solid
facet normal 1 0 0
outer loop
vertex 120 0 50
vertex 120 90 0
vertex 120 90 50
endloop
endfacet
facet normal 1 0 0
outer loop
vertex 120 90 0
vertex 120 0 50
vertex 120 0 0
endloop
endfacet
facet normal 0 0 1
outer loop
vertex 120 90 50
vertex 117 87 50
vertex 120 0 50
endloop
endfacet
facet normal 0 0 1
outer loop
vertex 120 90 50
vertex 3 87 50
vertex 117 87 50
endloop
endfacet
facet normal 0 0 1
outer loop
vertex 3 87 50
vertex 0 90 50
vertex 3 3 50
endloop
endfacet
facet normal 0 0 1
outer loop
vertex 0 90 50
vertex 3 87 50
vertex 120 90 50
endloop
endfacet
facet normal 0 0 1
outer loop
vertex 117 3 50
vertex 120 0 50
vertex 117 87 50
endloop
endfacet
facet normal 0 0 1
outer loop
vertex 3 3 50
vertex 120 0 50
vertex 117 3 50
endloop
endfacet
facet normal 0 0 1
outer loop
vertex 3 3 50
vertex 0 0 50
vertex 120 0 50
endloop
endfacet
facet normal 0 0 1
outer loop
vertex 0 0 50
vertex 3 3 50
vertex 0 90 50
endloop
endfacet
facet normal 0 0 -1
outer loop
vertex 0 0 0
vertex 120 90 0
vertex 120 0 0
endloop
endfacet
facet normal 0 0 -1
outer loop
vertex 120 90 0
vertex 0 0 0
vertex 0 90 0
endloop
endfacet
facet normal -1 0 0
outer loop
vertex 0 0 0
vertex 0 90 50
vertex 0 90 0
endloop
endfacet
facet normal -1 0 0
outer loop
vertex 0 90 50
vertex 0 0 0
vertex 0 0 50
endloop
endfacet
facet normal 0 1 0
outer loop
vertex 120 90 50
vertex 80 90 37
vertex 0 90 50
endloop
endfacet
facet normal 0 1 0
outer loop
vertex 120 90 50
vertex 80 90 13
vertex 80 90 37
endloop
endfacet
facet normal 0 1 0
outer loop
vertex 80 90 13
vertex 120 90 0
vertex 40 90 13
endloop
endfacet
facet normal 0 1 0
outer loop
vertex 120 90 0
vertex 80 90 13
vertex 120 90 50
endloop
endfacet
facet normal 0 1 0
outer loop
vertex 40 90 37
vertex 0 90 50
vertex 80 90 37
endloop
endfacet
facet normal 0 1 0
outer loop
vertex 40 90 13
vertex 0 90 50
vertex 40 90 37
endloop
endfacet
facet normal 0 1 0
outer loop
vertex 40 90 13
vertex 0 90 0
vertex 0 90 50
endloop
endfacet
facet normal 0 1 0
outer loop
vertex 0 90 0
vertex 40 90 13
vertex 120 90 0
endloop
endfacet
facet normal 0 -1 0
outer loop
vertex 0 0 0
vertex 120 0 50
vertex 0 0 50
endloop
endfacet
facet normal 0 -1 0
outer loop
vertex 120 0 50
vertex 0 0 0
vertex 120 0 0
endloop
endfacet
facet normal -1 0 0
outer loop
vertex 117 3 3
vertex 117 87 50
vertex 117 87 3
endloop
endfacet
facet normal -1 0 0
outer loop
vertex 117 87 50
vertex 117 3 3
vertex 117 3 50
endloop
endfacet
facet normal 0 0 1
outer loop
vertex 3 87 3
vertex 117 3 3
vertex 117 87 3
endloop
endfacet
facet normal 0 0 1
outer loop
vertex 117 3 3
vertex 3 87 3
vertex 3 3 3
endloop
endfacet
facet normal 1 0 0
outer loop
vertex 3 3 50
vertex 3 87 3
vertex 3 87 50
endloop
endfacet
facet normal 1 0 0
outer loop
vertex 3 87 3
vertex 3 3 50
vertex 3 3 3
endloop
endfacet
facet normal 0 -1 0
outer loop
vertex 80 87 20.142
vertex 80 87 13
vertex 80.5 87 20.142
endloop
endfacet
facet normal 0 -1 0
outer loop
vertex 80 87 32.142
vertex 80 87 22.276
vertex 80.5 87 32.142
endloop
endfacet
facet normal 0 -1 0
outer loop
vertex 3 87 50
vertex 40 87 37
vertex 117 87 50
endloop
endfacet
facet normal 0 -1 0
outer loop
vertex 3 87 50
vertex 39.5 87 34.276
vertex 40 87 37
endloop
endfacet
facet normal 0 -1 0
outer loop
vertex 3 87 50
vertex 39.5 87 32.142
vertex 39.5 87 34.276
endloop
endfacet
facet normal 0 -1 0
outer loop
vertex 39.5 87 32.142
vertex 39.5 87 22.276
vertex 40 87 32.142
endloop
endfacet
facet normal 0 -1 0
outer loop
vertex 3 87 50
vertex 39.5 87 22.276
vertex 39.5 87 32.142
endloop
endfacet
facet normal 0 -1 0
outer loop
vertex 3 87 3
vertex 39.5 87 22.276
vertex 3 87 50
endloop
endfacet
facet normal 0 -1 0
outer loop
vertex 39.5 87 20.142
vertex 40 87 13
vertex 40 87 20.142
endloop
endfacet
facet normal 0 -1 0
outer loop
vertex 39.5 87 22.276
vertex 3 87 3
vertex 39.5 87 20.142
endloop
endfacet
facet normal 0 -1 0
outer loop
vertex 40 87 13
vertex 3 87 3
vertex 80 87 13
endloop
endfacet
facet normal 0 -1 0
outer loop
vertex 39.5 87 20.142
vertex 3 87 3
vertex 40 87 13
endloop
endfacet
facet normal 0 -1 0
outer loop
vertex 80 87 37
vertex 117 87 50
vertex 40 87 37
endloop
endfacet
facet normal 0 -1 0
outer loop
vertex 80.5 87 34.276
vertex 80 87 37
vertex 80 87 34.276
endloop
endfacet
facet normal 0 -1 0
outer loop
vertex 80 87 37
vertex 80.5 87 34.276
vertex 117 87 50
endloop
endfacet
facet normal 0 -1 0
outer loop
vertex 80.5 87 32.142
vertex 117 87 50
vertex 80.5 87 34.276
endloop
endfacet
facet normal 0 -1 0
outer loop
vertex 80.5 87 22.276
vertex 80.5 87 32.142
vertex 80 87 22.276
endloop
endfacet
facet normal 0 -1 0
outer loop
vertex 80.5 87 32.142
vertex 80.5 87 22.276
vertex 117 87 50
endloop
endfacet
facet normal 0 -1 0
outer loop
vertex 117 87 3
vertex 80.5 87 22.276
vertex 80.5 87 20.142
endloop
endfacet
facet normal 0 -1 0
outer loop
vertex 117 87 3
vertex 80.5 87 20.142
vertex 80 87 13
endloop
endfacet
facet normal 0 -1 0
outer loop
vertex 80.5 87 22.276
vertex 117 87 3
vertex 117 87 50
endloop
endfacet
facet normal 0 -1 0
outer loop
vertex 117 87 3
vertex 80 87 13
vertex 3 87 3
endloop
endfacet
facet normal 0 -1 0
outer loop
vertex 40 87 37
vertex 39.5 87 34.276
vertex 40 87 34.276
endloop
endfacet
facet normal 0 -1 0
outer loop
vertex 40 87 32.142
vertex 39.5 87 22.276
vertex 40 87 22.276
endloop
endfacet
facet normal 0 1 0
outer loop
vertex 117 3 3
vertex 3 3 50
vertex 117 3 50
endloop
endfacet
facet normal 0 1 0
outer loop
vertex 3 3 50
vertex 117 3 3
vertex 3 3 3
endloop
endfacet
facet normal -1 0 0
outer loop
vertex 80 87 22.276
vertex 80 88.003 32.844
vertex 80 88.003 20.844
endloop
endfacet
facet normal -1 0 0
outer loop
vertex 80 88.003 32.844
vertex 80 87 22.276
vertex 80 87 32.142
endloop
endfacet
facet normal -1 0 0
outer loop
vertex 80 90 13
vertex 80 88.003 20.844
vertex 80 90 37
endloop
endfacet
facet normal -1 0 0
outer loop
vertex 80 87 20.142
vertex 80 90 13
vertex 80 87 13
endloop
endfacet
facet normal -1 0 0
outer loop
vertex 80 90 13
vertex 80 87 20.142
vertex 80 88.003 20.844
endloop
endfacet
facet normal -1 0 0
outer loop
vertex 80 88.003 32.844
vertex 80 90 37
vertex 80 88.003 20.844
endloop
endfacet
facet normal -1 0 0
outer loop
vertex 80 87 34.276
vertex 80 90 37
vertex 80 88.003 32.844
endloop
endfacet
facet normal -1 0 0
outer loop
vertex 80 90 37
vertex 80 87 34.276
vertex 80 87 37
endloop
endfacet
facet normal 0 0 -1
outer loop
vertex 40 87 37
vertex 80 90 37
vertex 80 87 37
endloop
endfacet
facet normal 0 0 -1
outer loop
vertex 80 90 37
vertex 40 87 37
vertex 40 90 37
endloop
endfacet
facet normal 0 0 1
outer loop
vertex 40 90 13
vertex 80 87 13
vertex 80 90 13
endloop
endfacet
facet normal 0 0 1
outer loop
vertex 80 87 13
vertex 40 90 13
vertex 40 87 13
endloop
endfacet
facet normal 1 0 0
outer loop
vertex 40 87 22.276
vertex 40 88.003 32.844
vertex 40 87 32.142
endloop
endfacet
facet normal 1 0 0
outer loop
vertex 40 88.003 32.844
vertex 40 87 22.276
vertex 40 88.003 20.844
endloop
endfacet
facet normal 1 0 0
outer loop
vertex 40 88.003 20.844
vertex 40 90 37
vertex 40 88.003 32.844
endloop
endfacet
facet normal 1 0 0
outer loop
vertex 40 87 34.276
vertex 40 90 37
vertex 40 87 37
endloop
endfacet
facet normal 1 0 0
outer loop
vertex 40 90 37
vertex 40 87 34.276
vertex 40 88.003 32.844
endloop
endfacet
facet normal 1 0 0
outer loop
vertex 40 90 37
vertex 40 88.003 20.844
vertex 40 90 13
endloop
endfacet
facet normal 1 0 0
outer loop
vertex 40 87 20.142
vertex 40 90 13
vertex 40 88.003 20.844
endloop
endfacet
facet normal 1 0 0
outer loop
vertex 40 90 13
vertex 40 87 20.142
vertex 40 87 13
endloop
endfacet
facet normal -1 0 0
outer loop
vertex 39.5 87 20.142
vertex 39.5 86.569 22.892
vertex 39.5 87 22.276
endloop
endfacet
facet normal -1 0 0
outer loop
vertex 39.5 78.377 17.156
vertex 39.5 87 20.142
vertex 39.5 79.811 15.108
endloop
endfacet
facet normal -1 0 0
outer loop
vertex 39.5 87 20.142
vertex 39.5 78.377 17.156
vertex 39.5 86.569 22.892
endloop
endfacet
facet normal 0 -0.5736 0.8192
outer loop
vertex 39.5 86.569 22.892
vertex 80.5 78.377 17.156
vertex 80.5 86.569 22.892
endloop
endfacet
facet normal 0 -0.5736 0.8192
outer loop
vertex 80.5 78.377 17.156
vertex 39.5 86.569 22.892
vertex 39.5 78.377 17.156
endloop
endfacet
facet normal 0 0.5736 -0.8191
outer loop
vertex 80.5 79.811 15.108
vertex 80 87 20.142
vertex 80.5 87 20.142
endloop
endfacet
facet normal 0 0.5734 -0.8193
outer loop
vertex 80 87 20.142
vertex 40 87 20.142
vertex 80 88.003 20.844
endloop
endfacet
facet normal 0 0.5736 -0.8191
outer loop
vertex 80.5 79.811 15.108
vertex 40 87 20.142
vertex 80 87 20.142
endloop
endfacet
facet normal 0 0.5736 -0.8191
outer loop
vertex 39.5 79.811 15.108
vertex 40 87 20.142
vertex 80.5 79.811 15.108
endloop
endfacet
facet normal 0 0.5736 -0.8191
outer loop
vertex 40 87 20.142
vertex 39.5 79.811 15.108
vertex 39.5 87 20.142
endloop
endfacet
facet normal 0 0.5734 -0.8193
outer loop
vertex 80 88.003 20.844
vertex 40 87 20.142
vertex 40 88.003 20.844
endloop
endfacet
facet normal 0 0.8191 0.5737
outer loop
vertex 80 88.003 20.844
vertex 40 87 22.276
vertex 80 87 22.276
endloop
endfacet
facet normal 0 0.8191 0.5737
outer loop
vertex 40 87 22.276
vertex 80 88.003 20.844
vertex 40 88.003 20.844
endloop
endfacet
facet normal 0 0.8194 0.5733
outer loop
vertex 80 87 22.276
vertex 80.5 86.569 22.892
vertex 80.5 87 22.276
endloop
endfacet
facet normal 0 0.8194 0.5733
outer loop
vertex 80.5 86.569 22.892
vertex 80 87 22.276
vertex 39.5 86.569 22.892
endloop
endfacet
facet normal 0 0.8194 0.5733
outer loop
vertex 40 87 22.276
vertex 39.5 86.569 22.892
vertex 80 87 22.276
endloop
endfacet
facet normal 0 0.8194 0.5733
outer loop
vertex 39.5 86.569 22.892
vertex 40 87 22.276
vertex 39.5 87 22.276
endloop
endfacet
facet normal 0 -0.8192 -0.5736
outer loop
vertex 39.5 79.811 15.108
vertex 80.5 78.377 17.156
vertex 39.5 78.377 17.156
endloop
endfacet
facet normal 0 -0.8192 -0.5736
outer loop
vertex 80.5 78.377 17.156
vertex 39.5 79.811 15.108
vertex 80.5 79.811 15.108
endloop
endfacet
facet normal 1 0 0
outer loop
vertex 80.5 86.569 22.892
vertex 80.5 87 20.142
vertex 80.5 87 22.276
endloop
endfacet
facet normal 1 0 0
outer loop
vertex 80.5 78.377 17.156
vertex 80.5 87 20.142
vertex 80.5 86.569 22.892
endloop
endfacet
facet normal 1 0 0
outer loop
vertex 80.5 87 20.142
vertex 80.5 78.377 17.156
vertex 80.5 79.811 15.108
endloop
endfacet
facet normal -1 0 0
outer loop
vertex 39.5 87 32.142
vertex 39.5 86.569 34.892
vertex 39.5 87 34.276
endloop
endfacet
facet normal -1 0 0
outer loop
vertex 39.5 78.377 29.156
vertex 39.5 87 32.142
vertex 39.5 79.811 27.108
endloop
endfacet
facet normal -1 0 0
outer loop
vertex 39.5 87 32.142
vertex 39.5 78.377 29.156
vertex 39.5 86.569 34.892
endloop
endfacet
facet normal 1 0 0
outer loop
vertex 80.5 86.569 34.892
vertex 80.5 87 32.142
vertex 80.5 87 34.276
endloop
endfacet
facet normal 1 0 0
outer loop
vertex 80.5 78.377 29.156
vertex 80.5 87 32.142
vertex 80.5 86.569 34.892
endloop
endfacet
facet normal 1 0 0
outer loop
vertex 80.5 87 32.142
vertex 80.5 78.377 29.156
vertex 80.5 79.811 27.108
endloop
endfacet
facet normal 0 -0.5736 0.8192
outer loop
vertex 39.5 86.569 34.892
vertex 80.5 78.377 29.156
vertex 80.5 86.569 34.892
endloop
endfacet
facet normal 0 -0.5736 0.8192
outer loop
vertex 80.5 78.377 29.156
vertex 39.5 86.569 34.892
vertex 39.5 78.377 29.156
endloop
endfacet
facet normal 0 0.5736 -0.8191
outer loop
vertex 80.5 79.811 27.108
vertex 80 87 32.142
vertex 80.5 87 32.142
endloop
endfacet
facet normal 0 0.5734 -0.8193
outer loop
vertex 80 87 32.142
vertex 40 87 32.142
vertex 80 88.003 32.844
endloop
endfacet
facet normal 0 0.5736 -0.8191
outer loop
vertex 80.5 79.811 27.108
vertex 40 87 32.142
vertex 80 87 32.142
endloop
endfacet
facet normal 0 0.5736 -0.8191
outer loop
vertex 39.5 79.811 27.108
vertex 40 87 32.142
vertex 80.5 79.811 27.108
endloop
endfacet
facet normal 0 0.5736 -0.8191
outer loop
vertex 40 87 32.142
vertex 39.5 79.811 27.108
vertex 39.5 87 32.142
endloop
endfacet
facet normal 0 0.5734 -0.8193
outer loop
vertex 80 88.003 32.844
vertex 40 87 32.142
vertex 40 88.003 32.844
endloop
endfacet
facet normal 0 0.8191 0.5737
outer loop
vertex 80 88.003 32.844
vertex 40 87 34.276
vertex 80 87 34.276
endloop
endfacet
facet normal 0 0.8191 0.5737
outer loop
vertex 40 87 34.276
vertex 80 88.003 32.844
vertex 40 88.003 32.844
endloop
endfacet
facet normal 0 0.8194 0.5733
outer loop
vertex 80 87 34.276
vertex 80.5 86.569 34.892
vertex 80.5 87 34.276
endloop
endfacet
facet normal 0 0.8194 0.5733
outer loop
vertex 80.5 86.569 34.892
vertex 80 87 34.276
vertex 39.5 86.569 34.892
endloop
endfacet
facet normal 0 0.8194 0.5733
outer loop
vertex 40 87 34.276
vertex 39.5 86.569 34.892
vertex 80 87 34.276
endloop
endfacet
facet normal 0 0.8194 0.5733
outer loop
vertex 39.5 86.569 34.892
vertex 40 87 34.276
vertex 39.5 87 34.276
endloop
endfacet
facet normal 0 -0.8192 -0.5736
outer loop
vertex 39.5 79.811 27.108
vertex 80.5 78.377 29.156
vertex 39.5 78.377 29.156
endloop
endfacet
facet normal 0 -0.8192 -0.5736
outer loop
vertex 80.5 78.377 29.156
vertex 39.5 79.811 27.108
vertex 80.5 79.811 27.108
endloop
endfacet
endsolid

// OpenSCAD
$fn = 32;

// ----------------------------------------------------------------------
// Vent box: louvers enclosure
// ----------------------------------------------------------------------

// --- parameters (mm) ---
box_l = 120;              // box length, X
box_w = 90;               // box width, Y
box_h = 50;               // box height, Z
wall_t = 3;               // shell wall thickness
win_l = 40;               // vent window width, X
win_h = 24;               // vent window height, Z
slat_t = 2.5;             // louver slat thickness
slat_d = 10;              // louver slat depth
slat_a = 35;              // louver slat angle, degrees
slat_pitch = 12;          // louver pitch
slat_yc = 83.19;          // slat centreline Y

win_z0 = (box_h - win_h) / 2;  // window lower edge Z
n_slats = 2;  // louver count
slat_z0 = win_z0 + (win_h - (n_slats - 1) * slat_pitch) / 2;

difference() {
  union() {
    difference() {
      cube([box_l, box_w, box_h]);
  translate([wall_t, wall_t, wall_t])
    cube([box_l - 2 * wall_t, box_w - 2 * wall_t, box_h]);
  translate([(box_l - win_l) / 2, box_w - wall_t - 1, win_z0])
    cube([win_l, wall_t + 2, win_h]);
    }
    for (i = [0 : n_slats - 1])
      translate([box_l / 2, slat_yc, slat_z0 + i * slat_pitch])
        rotate([slat_a, 0, 0])
          cube([win_l + 1, slat_d, slat_t], center = true);
  }
}
